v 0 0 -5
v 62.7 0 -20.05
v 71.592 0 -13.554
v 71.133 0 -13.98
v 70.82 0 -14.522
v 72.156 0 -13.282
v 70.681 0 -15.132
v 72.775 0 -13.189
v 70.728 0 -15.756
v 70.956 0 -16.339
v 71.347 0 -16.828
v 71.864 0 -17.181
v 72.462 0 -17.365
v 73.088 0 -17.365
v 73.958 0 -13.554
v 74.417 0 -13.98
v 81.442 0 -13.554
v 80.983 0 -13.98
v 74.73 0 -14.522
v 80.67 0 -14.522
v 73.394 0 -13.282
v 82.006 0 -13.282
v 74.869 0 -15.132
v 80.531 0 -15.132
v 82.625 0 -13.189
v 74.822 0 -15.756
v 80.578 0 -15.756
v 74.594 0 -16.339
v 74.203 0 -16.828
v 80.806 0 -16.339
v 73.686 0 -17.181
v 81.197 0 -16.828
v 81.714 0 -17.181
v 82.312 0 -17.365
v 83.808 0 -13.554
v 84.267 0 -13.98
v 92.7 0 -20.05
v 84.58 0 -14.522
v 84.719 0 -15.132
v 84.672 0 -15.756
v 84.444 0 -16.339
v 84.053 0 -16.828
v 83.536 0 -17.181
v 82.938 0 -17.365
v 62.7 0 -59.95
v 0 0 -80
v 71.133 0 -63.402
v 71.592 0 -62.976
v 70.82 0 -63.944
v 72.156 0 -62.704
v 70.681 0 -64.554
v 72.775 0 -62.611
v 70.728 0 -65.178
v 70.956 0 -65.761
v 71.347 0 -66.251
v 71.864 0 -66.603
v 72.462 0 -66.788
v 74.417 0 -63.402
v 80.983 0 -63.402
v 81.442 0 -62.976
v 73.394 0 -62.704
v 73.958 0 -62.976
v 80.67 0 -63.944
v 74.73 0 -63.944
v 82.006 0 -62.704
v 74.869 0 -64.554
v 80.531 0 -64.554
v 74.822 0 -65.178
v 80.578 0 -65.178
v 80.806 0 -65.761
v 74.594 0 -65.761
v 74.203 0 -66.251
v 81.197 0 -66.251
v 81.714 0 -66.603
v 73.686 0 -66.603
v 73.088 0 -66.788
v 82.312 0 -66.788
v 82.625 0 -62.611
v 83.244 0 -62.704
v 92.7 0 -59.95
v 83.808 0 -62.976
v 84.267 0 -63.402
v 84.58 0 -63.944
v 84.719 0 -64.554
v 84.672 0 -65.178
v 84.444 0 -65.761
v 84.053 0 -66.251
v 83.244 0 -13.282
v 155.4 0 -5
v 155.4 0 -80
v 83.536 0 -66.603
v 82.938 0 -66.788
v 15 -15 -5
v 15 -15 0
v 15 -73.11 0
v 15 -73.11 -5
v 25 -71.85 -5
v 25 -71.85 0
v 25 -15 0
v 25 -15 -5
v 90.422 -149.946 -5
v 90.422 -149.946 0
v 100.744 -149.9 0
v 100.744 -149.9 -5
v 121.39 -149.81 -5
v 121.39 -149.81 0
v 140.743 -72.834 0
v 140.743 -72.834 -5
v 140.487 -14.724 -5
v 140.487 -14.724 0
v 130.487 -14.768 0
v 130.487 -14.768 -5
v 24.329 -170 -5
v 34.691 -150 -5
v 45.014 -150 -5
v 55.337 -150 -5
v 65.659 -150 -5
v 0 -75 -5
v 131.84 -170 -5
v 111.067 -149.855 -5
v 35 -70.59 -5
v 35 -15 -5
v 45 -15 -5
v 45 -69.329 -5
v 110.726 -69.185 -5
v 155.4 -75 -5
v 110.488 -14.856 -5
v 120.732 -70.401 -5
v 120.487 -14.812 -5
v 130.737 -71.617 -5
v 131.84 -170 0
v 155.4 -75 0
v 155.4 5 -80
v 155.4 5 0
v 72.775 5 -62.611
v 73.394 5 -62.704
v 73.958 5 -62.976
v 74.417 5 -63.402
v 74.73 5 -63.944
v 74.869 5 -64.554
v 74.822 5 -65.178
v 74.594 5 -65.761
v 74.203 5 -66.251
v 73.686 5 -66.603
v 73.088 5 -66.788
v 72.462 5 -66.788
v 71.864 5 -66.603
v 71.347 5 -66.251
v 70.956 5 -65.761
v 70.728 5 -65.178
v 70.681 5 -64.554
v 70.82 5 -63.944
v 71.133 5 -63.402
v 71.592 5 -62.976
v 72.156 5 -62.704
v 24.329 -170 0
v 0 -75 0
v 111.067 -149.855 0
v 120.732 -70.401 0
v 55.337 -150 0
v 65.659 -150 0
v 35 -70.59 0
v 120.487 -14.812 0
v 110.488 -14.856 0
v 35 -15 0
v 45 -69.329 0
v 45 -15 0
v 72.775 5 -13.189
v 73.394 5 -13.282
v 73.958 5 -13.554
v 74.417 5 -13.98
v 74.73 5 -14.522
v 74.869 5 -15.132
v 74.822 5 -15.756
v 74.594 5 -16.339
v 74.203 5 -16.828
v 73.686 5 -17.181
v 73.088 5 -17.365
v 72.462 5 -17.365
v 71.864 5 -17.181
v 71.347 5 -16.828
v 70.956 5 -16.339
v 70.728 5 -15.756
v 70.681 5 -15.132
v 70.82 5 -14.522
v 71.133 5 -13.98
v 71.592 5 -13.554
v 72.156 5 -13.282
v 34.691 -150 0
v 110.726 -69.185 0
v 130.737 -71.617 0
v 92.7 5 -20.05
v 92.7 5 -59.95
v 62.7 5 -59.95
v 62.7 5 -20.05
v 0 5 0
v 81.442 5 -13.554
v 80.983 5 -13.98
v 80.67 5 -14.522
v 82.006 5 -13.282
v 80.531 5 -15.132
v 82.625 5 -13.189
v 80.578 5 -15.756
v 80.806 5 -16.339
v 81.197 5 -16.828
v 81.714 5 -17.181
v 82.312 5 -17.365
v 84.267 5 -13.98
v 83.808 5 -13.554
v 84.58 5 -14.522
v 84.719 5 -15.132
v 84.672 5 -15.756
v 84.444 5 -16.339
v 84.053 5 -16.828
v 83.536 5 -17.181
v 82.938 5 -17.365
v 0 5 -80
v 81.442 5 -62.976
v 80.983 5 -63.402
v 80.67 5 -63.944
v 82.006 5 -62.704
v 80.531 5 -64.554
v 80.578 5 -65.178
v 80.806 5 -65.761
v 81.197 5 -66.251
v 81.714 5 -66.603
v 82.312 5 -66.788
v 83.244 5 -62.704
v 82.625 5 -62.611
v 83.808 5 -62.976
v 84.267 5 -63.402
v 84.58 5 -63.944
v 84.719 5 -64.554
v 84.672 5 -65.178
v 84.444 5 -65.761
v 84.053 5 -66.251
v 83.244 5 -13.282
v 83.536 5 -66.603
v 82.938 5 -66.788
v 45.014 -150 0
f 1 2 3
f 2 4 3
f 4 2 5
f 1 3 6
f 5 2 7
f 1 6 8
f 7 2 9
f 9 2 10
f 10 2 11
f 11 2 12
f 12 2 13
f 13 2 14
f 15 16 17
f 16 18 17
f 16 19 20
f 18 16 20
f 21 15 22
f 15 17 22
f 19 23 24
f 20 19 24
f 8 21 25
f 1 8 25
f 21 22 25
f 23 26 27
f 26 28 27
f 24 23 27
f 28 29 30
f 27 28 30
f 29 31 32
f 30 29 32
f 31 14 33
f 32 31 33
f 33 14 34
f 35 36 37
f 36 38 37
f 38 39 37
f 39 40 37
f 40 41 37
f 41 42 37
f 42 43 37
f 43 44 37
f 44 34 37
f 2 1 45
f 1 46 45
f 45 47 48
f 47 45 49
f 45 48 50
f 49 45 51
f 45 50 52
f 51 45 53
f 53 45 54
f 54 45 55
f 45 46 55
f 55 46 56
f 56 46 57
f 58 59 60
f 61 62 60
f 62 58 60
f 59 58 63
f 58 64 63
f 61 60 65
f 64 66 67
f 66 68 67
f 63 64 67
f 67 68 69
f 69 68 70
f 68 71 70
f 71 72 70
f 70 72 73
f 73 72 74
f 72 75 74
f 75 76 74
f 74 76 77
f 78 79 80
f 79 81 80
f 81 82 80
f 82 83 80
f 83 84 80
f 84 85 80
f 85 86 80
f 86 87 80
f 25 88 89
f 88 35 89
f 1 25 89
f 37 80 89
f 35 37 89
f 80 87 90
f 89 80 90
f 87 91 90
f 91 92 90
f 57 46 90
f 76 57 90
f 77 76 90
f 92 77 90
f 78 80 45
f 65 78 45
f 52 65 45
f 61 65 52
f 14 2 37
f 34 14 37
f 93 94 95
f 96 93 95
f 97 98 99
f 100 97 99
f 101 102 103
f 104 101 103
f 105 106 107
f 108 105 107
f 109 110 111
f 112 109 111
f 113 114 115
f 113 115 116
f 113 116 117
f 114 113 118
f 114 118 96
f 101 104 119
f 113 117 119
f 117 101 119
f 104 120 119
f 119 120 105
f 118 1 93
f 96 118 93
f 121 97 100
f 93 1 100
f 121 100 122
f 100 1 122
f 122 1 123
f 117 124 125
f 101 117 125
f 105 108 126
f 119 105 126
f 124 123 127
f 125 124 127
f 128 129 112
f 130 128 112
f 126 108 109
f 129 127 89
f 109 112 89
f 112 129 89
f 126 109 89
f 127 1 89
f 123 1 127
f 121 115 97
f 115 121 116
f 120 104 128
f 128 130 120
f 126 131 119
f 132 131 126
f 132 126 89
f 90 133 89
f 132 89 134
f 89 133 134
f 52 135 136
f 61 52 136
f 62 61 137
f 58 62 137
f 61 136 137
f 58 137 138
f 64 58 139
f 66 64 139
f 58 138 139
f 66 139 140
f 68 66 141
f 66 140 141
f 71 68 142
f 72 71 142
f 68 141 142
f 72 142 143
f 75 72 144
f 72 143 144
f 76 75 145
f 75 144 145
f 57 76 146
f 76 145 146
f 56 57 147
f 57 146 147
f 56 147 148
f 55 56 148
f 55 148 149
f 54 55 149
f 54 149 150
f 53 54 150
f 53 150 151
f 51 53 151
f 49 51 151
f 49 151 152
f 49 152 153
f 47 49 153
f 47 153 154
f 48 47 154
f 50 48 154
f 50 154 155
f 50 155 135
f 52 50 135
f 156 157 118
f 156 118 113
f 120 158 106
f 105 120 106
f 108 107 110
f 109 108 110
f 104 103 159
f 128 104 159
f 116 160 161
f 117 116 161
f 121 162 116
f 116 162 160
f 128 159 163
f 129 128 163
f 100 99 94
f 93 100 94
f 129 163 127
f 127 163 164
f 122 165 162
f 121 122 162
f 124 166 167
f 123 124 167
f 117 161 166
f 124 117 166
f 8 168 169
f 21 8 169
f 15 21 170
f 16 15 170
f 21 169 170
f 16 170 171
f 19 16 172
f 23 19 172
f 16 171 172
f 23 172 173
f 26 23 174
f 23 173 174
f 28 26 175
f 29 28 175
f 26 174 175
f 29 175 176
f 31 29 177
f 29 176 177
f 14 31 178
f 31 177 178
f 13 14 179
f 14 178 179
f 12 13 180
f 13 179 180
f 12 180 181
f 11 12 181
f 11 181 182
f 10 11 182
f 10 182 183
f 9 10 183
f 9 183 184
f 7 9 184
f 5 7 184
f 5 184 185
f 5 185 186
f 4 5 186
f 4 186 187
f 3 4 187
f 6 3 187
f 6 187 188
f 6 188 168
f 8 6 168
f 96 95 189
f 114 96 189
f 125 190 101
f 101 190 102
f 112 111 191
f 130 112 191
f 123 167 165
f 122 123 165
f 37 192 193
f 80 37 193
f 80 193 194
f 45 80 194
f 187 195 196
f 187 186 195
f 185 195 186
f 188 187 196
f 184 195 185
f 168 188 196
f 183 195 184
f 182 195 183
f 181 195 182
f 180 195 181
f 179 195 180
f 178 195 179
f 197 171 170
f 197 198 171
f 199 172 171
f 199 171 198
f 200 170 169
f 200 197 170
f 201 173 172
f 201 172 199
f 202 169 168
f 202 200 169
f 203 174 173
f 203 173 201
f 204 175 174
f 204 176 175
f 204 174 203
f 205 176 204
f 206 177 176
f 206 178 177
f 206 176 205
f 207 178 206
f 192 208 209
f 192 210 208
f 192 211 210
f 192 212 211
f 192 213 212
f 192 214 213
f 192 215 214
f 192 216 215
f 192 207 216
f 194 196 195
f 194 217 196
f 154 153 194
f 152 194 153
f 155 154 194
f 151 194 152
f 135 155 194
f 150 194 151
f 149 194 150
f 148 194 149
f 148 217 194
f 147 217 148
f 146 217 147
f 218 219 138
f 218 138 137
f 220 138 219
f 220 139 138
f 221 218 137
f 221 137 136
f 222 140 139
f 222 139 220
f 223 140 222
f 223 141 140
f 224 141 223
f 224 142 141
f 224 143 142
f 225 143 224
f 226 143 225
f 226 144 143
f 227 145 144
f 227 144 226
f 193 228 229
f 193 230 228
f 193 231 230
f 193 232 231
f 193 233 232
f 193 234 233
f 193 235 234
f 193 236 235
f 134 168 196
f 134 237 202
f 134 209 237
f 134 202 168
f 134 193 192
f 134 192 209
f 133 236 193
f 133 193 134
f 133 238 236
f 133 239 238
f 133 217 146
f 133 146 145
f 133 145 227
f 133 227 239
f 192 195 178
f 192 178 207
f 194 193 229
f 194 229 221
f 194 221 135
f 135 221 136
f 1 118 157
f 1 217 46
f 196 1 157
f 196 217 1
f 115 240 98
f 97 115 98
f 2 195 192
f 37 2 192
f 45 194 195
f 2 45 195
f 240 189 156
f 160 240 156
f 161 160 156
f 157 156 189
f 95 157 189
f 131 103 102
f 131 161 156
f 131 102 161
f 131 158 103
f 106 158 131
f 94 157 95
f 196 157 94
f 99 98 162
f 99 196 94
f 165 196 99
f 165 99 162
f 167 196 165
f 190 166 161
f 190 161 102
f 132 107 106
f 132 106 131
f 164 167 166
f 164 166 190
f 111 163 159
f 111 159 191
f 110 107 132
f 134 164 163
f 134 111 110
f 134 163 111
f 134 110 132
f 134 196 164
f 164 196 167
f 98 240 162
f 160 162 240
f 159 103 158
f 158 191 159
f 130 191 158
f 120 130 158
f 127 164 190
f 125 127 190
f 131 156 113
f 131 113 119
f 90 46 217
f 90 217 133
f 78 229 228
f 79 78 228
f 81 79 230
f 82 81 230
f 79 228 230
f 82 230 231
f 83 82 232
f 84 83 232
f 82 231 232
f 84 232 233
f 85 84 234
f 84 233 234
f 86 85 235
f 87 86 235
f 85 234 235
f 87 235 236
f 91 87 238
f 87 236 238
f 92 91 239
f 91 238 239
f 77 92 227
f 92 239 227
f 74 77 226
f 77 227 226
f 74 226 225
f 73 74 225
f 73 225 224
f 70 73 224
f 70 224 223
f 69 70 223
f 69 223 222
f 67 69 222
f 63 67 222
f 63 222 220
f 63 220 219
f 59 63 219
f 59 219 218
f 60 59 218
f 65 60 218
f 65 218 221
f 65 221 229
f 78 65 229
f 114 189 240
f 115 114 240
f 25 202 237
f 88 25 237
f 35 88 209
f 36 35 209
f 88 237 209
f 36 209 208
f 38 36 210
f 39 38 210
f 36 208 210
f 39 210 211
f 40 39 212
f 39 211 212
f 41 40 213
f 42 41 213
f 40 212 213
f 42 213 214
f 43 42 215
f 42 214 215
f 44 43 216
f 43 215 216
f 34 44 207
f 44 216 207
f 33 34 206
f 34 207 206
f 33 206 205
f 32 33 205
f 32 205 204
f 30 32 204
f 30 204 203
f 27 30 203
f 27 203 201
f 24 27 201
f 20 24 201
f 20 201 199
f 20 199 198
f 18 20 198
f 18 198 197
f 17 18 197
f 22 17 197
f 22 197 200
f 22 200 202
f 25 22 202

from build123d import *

# Parameters (mm, degrees)
SKETCH1_W           = 155.4
SKETCH1_H           = 80
BOSS_EXTRUDE1_DEPTH = 5
SKETCH2_W           = 155.4
SKETCH2_H           = 5
BOSS_EXTRUDE2_DEPTH = 75
BOSS_EXTRUDE3_DEPTH = 5
CUT_EXTRUDE2_REACH  = 249.334
SKETCH7_R           = 2.1
CUT_EXTRUDE3_REACH  = 245.822


with BuildPart() as part:
    # Sketch1 → Boss-Extrude1 (new body)
    with BuildSketch(Plane(origin=(0, 0, 0), x_dir=(1, 0, 0), z_dir=(0, 1, 0))):
        with Locations((77.7, 40)):
            Rectangle(SKETCH1_W, SKETCH1_H)
    extrude(amount=BOSS_EXTRUDE1_DEPTH)

    # Sketch2 → Boss-Extrude2 (add)
    with BuildSketch(Plane.XZ):
        with Locations((77.7, -2.5)):
            Rectangle(SKETCH2_W, SKETCH2_H)
    extrude(amount=BOSS_EXTRUDE2_DEPTH)

    # Sketch4 → Boss-Extrude3 (add)
    with BuildSketch(Plane.XY):
        Polygon((131.839983018, -170), (155.4, -75), (0.768966036, -75), (0, -75), (24.328983018, -170), (26.154336071, -170), align=None)
    extrude(amount=-BOSS_EXTRUDE3_DEPTH)

    # Sketch7 → Cut-Extrude2 (cut, up to next)
    with BuildSketch(Plane(origin=(0, 5, 0), x_dir=(1, 0, 0), z_dir=(0, 1, 0)), mode=Mode.PRIVATE) as cut_extrude2_sk1:
        with BuildLine():
            Line((92.7, 20.05), (92.7, 59.95))
            Line((92.7, 59.95), (77.7, 59.95))
            Line((77.7, 59.95), (77.7, 36.45))
            ThreePointArc((77.7, 36.45), (82.331549417, 34.531549417), (84.25, 29.9))
            ThreePointArc((84.25, 29.9), (82.331549417, 25.268450583), (77.7, 23.35))
            Line((77.7, 23.35), (77.7, 20.05))
            Line((77.7, 20.05), (92.7, 20.05))
        make_face()
    cut_extrude2_tool1 = extrude(cut_extrude2_sk1.sketch, amount=-CUT_EXTRUDE2_REACH, mode=Mode.PRIVATE) & part.part
    # Sketch7 → Cut-Extrude2 (cut, up to next)
    with BuildSketch(Plane(origin=(0, 5, 0), x_dir=(1, 0, 0), z_dir=(0, 1, 0)), mode=Mode.PRIVATE) as cut_extrude2_sk2:
        with BuildLine():
            Line((77.7, 36.45), (77.7, 59.95))
            Line((77.7, 59.95), (62.7, 59.95))
            Line((62.7, 59.95), (62.7, 20.05))
            Line((62.7, 20.05), (77.7, 20.05))
            Line((77.7, 20.05), (77.7, 23.35))
            ThreePointArc((77.7, 23.35), (71.15, 29.9), (77.7, 36.45))
        make_face()
    cut_extrude2_tool2 = extrude(cut_extrude2_sk2.sketch, amount=-CUT_EXTRUDE2_REACH, mode=Mode.PRIVATE) & part.part
    # Sketch7 → Cut-Extrude2 (cut, up to next)
    with BuildSketch(Plane(origin=(0, 5, 0), x_dir=(1, 0, 0), z_dir=(0, 1, 0)), mode=Mode.PRIVATE) as cut_extrude2_sk3:
        with BuildLine():
            ThreePointArc((84.25, 29.9), (82.331549417, 34.531549417), (77.7, 36.45))
            Line((77.7, 36.45), (77.7, 23.35))
            ThreePointArc((77.7, 23.35), (82.331549417, 25.268450583), (84.25, 29.9))
        make_face()
    cut_extrude2_tool3 = extrude(cut_extrude2_sk3.sketch, amount=-CUT_EXTRUDE2_REACH, mode=Mode.PRIVATE) & part.part
    # Sketch7 → Cut-Extrude2 (cut, up to next)
    with BuildSketch(Plane(origin=(0, 5, 0), x_dir=(1, 0, 0), z_dir=(0, 1, 0)), mode=Mode.PRIVATE) as cut_extrude2_sk4:
        with BuildLine():
            Line((77.7, 23.35), (77.7, 36.45))
            ThreePointArc((77.7, 36.45), (71.15, 29.9), (77.7, 23.35))
        make_face()
    cut_extrude2_tool4 = extrude(cut_extrude2_sk4.sketch, amount=-CUT_EXTRUDE2_REACH, mode=Mode.PRIVATE) & part.part
    # Sketch7 → Cut-Extrude2 (cut, up to next)
    with BuildSketch(Plane(origin=(0, 5, 0), x_dir=(1, 0, 0), z_dir=(0, 1, 0)), mode=Mode.PRIVATE) as cut_extrude2_sk5:
        with BuildLine():
            ThreePointArc((84.25, 29.9), (82.331549417, 34.531549417), (77.7, 36.45))
            Line((77.7, 36.45), (77.7, 23.35))
            ThreePointArc((77.7, 23.35), (82.331549417, 25.268450583), (84.25, 29.9))
        make_face()
    cut_extrude2_tool5 = extrude(cut_extrude2_sk5.sketch, amount=-CUT_EXTRUDE2_REACH, mode=Mode.PRIVATE) & part.part
    # Sketch7 → Cut-Extrude2 (cut, up to next)
    with BuildSketch(Plane(origin=(0, 5, 0), x_dir=(1, 0, 0), z_dir=(0, 1, 0)), mode=Mode.PRIVATE) as cut_extrude2_sk6:
        with BuildLine():
            Line((77.7, 23.35), (77.7, 36.45))
            ThreePointArc((77.7, 36.45), (71.15, 29.9), (77.7, 23.35))
        make_face()
    cut_extrude2_tool6 = extrude(cut_extrude2_sk6.sketch, amount=-CUT_EXTRUDE2_REACH, mode=Mode.PRIVATE) & part.part
    # Sketch7 → Cut-Extrude2 (cut, up to next)
    with BuildSketch(Plane(origin=(0, 5, 0), x_dir=(1, 0, 0), z_dir=(0, 1, 0)), mode=Mode.PRIVATE) as cut_extrude2_sk7:
        with Locations(Location((82.625, 15.288854382, 0), (0, 0, 270))):
            Circle(SKETCH7_R)
    cut_extrude2_tool7 = extrude(cut_extrude2_sk7.sketch, amount=-CUT_EXTRUDE2_REACH, mode=Mode.PRIVATE) & part.part
    # Sketch7 → Cut-Extrude2 (cut, up to next)
    with BuildSketch(Plane(origin=(0, 5, 0), x_dir=(1, 0, 0), z_dir=(0, 1, 0)), mode=Mode.PRIVATE) as cut_extrude2_sk8:
        with Locations(Location((72.775, 15.288854382, 0), (0, 0, 270))):
            Circle(SKETCH7_R)
    cut_extrude2_tool8 = extrude(cut_extrude2_sk8.sketch, amount=-CUT_EXTRUDE2_REACH, mode=Mode.PRIVATE) & part.part
    # Sketch7 → Cut-Extrude2 (cut, up to next)
    with BuildSketch(Plane(origin=(0, 5, 0), x_dir=(1, 0, 0), z_dir=(0, 1, 0)), mode=Mode.PRIVATE) as cut_extrude2_sk9:
        with Locations(Location((72.775, 64.711145618, 0), (0, 0, 270))):
            Circle(SKETCH7_R)
    cut_extrude2_tool9 = extrude(cut_extrude2_sk9.sketch, amount=-CUT_EXTRUDE2_REACH, mode=Mode.PRIVATE) & part.part
    # Sketch7 → Cut-Extrude2 (cut, up to next)
    with BuildSketch(Plane(origin=(0, 5, 0), x_dir=(1, 0, 0), z_dir=(0, 1, 0)), mode=Mode.PRIVATE) as cut_extrude2_sk10:
        with Locations(Location((82.625, 64.711145618, 0), (0, 0, 270))):
            Circle(SKETCH7_R)
    cut_extrude2_tool10 = extrude(cut_extrude2_sk10.sketch, amount=-CUT_EXTRUDE2_REACH, mode=Mode.PRIVATE) & part.part
    add(cut_extrude2_tool1.solids().sort_by_distance((85.798921, 5, -41.281564))[0], mode=Mode.SUBTRACT)
    add(cut_extrude2_tool2.solids().sort_by_distance((69.601079, 5, -41.281564))[0], mode=Mode.SUBTRACT)
    add(cut_extrude2_tool3.solids().sort_by_distance((80.479906, 5, -29.9))[0], mode=Mode.SUBTRACT)
    add(cut_extrude2_tool4.solids().sort_by_distance((74.920094, 5, -29.9))[0], mode=Mode.SUBTRACT)
    add(cut_extrude2_tool5.solids().sort_by_distance((80.479906, 5, -29.9))[0], mode=Mode.SUBTRACT)
    add(cut_extrude2_tool6.solids().sort_by_distance((74.920094, 5, -29.9))[0], mode=Mode.SUBTRACT)
    add(cut_extrude2_tool7.solids().sort_by_distance((82.625, 5, -15.288854))[0], mode=Mode.SUBTRACT)
    add(cut_extrude2_tool8.solids().sort_by_distance((72.775, 5, -15.288854))[0], mode=Mode.SUBTRACT)
    add(cut_extrude2_tool9.solids().sort_by_distance((72.775, 5, -64.711146))[0], mode=Mode.SUBTRACT)
    add(cut_extrude2_tool10.solids().sort_by_distance((82.625, 5, -64.711146))[0], mode=Mode.SUBTRACT)

    # Sketch8 → Cut-Extrude3 (cut, up to next)
    with BuildSketch(Plane.XY, mode=Mode.PRIVATE) as cut_extrude3_sk1:
        Polygon((25, -71.849651243), (25, -15), (15, -15), (15, -73.109790746), (34.69116416, -150), (45.013879029, -150), align=None)
    cut_extrude3_tool1 = extrude(cut_extrude3_sk1.sketch, amount=-CUT_EXTRUDE3_REACH, mode=Mode.PRIVATE) & part.part
    # Sketch8 → Cut-Extrude3 (cut, up to next)
    with BuildSketch(Plane.XY, mode=Mode.PRIVATE) as cut_extrude3_sk2:
        Polygon((45, -15), (35, -15), (35, -70.589511741), (55.336593898, -150), (65.659308767, -150), (45, -69.329372238), align=None)
    cut_extrude3_tool2 = extrude(cut_extrude3_sk2.sketch, amount=-CUT_EXTRUDE3_REACH, mode=Mode.PRIVATE) & part.part
    # Sketch8 → Cut-Extrude3 (cut, up to next)
    with BuildSketch(Plane.XY, mode=Mode.PRIVATE) as cut_extrude3_sk3:
        Polygon((90.421655908, -149.945595989), (100.744271122, -149.900237253), (120.731733413, -70.401155194), (120.487469184, -14.812180114), (110.487565723, -14.856120818), (110.726292811, -69.184968561), align=None)
    cut_extrude3_tool3 = extrude(cut_extrude3_sk3.sketch, amount=-CUT_EXTRUDE3_REACH, mode=Mode.PRIVATE) & part.part
    # Sketch8 → Cut-Extrude3 (cut, up to next)
    with BuildSketch(Plane.XY, mode=Mode.PRIVATE) as cut_extrude3_sk4:
        Polygon((111.066886336, -149.854878517), (121.389501549, -149.809519781), (140.742614617, -72.833528461), (140.487276104, -14.724298705), (130.487372644, -14.768239409), (130.737174015, -71.617341828), align=None)
    cut_extrude3_tool4 = extrude(cut_extrude3_sk4.sketch, amount=-CUT_EXTRUDE3_REACH, mode=Mode.PRIVATE) & part.part
    add(cut_extrude3_tool1.solids().sort_by_distance((25.777168, -83.022875, 0))[0], mode=Mode.SUBTRACT)
    add(cut_extrude3_tool2.solids().sort_by_distance((46.155254, -83.015898, 0))[0], mode=Mode.SUBTRACT)
    add(cut_extrude3_tool3.solids().sort_by_distance((109.631189, -82.876438, 0))[0], mode=Mode.SUBTRACT)
    add(cut_extrude3_tool4.solids().sort_by_distance((130.00911, -82.793873, 0))[0], mode=Mode.SUBTRACT)


solid = part.part
